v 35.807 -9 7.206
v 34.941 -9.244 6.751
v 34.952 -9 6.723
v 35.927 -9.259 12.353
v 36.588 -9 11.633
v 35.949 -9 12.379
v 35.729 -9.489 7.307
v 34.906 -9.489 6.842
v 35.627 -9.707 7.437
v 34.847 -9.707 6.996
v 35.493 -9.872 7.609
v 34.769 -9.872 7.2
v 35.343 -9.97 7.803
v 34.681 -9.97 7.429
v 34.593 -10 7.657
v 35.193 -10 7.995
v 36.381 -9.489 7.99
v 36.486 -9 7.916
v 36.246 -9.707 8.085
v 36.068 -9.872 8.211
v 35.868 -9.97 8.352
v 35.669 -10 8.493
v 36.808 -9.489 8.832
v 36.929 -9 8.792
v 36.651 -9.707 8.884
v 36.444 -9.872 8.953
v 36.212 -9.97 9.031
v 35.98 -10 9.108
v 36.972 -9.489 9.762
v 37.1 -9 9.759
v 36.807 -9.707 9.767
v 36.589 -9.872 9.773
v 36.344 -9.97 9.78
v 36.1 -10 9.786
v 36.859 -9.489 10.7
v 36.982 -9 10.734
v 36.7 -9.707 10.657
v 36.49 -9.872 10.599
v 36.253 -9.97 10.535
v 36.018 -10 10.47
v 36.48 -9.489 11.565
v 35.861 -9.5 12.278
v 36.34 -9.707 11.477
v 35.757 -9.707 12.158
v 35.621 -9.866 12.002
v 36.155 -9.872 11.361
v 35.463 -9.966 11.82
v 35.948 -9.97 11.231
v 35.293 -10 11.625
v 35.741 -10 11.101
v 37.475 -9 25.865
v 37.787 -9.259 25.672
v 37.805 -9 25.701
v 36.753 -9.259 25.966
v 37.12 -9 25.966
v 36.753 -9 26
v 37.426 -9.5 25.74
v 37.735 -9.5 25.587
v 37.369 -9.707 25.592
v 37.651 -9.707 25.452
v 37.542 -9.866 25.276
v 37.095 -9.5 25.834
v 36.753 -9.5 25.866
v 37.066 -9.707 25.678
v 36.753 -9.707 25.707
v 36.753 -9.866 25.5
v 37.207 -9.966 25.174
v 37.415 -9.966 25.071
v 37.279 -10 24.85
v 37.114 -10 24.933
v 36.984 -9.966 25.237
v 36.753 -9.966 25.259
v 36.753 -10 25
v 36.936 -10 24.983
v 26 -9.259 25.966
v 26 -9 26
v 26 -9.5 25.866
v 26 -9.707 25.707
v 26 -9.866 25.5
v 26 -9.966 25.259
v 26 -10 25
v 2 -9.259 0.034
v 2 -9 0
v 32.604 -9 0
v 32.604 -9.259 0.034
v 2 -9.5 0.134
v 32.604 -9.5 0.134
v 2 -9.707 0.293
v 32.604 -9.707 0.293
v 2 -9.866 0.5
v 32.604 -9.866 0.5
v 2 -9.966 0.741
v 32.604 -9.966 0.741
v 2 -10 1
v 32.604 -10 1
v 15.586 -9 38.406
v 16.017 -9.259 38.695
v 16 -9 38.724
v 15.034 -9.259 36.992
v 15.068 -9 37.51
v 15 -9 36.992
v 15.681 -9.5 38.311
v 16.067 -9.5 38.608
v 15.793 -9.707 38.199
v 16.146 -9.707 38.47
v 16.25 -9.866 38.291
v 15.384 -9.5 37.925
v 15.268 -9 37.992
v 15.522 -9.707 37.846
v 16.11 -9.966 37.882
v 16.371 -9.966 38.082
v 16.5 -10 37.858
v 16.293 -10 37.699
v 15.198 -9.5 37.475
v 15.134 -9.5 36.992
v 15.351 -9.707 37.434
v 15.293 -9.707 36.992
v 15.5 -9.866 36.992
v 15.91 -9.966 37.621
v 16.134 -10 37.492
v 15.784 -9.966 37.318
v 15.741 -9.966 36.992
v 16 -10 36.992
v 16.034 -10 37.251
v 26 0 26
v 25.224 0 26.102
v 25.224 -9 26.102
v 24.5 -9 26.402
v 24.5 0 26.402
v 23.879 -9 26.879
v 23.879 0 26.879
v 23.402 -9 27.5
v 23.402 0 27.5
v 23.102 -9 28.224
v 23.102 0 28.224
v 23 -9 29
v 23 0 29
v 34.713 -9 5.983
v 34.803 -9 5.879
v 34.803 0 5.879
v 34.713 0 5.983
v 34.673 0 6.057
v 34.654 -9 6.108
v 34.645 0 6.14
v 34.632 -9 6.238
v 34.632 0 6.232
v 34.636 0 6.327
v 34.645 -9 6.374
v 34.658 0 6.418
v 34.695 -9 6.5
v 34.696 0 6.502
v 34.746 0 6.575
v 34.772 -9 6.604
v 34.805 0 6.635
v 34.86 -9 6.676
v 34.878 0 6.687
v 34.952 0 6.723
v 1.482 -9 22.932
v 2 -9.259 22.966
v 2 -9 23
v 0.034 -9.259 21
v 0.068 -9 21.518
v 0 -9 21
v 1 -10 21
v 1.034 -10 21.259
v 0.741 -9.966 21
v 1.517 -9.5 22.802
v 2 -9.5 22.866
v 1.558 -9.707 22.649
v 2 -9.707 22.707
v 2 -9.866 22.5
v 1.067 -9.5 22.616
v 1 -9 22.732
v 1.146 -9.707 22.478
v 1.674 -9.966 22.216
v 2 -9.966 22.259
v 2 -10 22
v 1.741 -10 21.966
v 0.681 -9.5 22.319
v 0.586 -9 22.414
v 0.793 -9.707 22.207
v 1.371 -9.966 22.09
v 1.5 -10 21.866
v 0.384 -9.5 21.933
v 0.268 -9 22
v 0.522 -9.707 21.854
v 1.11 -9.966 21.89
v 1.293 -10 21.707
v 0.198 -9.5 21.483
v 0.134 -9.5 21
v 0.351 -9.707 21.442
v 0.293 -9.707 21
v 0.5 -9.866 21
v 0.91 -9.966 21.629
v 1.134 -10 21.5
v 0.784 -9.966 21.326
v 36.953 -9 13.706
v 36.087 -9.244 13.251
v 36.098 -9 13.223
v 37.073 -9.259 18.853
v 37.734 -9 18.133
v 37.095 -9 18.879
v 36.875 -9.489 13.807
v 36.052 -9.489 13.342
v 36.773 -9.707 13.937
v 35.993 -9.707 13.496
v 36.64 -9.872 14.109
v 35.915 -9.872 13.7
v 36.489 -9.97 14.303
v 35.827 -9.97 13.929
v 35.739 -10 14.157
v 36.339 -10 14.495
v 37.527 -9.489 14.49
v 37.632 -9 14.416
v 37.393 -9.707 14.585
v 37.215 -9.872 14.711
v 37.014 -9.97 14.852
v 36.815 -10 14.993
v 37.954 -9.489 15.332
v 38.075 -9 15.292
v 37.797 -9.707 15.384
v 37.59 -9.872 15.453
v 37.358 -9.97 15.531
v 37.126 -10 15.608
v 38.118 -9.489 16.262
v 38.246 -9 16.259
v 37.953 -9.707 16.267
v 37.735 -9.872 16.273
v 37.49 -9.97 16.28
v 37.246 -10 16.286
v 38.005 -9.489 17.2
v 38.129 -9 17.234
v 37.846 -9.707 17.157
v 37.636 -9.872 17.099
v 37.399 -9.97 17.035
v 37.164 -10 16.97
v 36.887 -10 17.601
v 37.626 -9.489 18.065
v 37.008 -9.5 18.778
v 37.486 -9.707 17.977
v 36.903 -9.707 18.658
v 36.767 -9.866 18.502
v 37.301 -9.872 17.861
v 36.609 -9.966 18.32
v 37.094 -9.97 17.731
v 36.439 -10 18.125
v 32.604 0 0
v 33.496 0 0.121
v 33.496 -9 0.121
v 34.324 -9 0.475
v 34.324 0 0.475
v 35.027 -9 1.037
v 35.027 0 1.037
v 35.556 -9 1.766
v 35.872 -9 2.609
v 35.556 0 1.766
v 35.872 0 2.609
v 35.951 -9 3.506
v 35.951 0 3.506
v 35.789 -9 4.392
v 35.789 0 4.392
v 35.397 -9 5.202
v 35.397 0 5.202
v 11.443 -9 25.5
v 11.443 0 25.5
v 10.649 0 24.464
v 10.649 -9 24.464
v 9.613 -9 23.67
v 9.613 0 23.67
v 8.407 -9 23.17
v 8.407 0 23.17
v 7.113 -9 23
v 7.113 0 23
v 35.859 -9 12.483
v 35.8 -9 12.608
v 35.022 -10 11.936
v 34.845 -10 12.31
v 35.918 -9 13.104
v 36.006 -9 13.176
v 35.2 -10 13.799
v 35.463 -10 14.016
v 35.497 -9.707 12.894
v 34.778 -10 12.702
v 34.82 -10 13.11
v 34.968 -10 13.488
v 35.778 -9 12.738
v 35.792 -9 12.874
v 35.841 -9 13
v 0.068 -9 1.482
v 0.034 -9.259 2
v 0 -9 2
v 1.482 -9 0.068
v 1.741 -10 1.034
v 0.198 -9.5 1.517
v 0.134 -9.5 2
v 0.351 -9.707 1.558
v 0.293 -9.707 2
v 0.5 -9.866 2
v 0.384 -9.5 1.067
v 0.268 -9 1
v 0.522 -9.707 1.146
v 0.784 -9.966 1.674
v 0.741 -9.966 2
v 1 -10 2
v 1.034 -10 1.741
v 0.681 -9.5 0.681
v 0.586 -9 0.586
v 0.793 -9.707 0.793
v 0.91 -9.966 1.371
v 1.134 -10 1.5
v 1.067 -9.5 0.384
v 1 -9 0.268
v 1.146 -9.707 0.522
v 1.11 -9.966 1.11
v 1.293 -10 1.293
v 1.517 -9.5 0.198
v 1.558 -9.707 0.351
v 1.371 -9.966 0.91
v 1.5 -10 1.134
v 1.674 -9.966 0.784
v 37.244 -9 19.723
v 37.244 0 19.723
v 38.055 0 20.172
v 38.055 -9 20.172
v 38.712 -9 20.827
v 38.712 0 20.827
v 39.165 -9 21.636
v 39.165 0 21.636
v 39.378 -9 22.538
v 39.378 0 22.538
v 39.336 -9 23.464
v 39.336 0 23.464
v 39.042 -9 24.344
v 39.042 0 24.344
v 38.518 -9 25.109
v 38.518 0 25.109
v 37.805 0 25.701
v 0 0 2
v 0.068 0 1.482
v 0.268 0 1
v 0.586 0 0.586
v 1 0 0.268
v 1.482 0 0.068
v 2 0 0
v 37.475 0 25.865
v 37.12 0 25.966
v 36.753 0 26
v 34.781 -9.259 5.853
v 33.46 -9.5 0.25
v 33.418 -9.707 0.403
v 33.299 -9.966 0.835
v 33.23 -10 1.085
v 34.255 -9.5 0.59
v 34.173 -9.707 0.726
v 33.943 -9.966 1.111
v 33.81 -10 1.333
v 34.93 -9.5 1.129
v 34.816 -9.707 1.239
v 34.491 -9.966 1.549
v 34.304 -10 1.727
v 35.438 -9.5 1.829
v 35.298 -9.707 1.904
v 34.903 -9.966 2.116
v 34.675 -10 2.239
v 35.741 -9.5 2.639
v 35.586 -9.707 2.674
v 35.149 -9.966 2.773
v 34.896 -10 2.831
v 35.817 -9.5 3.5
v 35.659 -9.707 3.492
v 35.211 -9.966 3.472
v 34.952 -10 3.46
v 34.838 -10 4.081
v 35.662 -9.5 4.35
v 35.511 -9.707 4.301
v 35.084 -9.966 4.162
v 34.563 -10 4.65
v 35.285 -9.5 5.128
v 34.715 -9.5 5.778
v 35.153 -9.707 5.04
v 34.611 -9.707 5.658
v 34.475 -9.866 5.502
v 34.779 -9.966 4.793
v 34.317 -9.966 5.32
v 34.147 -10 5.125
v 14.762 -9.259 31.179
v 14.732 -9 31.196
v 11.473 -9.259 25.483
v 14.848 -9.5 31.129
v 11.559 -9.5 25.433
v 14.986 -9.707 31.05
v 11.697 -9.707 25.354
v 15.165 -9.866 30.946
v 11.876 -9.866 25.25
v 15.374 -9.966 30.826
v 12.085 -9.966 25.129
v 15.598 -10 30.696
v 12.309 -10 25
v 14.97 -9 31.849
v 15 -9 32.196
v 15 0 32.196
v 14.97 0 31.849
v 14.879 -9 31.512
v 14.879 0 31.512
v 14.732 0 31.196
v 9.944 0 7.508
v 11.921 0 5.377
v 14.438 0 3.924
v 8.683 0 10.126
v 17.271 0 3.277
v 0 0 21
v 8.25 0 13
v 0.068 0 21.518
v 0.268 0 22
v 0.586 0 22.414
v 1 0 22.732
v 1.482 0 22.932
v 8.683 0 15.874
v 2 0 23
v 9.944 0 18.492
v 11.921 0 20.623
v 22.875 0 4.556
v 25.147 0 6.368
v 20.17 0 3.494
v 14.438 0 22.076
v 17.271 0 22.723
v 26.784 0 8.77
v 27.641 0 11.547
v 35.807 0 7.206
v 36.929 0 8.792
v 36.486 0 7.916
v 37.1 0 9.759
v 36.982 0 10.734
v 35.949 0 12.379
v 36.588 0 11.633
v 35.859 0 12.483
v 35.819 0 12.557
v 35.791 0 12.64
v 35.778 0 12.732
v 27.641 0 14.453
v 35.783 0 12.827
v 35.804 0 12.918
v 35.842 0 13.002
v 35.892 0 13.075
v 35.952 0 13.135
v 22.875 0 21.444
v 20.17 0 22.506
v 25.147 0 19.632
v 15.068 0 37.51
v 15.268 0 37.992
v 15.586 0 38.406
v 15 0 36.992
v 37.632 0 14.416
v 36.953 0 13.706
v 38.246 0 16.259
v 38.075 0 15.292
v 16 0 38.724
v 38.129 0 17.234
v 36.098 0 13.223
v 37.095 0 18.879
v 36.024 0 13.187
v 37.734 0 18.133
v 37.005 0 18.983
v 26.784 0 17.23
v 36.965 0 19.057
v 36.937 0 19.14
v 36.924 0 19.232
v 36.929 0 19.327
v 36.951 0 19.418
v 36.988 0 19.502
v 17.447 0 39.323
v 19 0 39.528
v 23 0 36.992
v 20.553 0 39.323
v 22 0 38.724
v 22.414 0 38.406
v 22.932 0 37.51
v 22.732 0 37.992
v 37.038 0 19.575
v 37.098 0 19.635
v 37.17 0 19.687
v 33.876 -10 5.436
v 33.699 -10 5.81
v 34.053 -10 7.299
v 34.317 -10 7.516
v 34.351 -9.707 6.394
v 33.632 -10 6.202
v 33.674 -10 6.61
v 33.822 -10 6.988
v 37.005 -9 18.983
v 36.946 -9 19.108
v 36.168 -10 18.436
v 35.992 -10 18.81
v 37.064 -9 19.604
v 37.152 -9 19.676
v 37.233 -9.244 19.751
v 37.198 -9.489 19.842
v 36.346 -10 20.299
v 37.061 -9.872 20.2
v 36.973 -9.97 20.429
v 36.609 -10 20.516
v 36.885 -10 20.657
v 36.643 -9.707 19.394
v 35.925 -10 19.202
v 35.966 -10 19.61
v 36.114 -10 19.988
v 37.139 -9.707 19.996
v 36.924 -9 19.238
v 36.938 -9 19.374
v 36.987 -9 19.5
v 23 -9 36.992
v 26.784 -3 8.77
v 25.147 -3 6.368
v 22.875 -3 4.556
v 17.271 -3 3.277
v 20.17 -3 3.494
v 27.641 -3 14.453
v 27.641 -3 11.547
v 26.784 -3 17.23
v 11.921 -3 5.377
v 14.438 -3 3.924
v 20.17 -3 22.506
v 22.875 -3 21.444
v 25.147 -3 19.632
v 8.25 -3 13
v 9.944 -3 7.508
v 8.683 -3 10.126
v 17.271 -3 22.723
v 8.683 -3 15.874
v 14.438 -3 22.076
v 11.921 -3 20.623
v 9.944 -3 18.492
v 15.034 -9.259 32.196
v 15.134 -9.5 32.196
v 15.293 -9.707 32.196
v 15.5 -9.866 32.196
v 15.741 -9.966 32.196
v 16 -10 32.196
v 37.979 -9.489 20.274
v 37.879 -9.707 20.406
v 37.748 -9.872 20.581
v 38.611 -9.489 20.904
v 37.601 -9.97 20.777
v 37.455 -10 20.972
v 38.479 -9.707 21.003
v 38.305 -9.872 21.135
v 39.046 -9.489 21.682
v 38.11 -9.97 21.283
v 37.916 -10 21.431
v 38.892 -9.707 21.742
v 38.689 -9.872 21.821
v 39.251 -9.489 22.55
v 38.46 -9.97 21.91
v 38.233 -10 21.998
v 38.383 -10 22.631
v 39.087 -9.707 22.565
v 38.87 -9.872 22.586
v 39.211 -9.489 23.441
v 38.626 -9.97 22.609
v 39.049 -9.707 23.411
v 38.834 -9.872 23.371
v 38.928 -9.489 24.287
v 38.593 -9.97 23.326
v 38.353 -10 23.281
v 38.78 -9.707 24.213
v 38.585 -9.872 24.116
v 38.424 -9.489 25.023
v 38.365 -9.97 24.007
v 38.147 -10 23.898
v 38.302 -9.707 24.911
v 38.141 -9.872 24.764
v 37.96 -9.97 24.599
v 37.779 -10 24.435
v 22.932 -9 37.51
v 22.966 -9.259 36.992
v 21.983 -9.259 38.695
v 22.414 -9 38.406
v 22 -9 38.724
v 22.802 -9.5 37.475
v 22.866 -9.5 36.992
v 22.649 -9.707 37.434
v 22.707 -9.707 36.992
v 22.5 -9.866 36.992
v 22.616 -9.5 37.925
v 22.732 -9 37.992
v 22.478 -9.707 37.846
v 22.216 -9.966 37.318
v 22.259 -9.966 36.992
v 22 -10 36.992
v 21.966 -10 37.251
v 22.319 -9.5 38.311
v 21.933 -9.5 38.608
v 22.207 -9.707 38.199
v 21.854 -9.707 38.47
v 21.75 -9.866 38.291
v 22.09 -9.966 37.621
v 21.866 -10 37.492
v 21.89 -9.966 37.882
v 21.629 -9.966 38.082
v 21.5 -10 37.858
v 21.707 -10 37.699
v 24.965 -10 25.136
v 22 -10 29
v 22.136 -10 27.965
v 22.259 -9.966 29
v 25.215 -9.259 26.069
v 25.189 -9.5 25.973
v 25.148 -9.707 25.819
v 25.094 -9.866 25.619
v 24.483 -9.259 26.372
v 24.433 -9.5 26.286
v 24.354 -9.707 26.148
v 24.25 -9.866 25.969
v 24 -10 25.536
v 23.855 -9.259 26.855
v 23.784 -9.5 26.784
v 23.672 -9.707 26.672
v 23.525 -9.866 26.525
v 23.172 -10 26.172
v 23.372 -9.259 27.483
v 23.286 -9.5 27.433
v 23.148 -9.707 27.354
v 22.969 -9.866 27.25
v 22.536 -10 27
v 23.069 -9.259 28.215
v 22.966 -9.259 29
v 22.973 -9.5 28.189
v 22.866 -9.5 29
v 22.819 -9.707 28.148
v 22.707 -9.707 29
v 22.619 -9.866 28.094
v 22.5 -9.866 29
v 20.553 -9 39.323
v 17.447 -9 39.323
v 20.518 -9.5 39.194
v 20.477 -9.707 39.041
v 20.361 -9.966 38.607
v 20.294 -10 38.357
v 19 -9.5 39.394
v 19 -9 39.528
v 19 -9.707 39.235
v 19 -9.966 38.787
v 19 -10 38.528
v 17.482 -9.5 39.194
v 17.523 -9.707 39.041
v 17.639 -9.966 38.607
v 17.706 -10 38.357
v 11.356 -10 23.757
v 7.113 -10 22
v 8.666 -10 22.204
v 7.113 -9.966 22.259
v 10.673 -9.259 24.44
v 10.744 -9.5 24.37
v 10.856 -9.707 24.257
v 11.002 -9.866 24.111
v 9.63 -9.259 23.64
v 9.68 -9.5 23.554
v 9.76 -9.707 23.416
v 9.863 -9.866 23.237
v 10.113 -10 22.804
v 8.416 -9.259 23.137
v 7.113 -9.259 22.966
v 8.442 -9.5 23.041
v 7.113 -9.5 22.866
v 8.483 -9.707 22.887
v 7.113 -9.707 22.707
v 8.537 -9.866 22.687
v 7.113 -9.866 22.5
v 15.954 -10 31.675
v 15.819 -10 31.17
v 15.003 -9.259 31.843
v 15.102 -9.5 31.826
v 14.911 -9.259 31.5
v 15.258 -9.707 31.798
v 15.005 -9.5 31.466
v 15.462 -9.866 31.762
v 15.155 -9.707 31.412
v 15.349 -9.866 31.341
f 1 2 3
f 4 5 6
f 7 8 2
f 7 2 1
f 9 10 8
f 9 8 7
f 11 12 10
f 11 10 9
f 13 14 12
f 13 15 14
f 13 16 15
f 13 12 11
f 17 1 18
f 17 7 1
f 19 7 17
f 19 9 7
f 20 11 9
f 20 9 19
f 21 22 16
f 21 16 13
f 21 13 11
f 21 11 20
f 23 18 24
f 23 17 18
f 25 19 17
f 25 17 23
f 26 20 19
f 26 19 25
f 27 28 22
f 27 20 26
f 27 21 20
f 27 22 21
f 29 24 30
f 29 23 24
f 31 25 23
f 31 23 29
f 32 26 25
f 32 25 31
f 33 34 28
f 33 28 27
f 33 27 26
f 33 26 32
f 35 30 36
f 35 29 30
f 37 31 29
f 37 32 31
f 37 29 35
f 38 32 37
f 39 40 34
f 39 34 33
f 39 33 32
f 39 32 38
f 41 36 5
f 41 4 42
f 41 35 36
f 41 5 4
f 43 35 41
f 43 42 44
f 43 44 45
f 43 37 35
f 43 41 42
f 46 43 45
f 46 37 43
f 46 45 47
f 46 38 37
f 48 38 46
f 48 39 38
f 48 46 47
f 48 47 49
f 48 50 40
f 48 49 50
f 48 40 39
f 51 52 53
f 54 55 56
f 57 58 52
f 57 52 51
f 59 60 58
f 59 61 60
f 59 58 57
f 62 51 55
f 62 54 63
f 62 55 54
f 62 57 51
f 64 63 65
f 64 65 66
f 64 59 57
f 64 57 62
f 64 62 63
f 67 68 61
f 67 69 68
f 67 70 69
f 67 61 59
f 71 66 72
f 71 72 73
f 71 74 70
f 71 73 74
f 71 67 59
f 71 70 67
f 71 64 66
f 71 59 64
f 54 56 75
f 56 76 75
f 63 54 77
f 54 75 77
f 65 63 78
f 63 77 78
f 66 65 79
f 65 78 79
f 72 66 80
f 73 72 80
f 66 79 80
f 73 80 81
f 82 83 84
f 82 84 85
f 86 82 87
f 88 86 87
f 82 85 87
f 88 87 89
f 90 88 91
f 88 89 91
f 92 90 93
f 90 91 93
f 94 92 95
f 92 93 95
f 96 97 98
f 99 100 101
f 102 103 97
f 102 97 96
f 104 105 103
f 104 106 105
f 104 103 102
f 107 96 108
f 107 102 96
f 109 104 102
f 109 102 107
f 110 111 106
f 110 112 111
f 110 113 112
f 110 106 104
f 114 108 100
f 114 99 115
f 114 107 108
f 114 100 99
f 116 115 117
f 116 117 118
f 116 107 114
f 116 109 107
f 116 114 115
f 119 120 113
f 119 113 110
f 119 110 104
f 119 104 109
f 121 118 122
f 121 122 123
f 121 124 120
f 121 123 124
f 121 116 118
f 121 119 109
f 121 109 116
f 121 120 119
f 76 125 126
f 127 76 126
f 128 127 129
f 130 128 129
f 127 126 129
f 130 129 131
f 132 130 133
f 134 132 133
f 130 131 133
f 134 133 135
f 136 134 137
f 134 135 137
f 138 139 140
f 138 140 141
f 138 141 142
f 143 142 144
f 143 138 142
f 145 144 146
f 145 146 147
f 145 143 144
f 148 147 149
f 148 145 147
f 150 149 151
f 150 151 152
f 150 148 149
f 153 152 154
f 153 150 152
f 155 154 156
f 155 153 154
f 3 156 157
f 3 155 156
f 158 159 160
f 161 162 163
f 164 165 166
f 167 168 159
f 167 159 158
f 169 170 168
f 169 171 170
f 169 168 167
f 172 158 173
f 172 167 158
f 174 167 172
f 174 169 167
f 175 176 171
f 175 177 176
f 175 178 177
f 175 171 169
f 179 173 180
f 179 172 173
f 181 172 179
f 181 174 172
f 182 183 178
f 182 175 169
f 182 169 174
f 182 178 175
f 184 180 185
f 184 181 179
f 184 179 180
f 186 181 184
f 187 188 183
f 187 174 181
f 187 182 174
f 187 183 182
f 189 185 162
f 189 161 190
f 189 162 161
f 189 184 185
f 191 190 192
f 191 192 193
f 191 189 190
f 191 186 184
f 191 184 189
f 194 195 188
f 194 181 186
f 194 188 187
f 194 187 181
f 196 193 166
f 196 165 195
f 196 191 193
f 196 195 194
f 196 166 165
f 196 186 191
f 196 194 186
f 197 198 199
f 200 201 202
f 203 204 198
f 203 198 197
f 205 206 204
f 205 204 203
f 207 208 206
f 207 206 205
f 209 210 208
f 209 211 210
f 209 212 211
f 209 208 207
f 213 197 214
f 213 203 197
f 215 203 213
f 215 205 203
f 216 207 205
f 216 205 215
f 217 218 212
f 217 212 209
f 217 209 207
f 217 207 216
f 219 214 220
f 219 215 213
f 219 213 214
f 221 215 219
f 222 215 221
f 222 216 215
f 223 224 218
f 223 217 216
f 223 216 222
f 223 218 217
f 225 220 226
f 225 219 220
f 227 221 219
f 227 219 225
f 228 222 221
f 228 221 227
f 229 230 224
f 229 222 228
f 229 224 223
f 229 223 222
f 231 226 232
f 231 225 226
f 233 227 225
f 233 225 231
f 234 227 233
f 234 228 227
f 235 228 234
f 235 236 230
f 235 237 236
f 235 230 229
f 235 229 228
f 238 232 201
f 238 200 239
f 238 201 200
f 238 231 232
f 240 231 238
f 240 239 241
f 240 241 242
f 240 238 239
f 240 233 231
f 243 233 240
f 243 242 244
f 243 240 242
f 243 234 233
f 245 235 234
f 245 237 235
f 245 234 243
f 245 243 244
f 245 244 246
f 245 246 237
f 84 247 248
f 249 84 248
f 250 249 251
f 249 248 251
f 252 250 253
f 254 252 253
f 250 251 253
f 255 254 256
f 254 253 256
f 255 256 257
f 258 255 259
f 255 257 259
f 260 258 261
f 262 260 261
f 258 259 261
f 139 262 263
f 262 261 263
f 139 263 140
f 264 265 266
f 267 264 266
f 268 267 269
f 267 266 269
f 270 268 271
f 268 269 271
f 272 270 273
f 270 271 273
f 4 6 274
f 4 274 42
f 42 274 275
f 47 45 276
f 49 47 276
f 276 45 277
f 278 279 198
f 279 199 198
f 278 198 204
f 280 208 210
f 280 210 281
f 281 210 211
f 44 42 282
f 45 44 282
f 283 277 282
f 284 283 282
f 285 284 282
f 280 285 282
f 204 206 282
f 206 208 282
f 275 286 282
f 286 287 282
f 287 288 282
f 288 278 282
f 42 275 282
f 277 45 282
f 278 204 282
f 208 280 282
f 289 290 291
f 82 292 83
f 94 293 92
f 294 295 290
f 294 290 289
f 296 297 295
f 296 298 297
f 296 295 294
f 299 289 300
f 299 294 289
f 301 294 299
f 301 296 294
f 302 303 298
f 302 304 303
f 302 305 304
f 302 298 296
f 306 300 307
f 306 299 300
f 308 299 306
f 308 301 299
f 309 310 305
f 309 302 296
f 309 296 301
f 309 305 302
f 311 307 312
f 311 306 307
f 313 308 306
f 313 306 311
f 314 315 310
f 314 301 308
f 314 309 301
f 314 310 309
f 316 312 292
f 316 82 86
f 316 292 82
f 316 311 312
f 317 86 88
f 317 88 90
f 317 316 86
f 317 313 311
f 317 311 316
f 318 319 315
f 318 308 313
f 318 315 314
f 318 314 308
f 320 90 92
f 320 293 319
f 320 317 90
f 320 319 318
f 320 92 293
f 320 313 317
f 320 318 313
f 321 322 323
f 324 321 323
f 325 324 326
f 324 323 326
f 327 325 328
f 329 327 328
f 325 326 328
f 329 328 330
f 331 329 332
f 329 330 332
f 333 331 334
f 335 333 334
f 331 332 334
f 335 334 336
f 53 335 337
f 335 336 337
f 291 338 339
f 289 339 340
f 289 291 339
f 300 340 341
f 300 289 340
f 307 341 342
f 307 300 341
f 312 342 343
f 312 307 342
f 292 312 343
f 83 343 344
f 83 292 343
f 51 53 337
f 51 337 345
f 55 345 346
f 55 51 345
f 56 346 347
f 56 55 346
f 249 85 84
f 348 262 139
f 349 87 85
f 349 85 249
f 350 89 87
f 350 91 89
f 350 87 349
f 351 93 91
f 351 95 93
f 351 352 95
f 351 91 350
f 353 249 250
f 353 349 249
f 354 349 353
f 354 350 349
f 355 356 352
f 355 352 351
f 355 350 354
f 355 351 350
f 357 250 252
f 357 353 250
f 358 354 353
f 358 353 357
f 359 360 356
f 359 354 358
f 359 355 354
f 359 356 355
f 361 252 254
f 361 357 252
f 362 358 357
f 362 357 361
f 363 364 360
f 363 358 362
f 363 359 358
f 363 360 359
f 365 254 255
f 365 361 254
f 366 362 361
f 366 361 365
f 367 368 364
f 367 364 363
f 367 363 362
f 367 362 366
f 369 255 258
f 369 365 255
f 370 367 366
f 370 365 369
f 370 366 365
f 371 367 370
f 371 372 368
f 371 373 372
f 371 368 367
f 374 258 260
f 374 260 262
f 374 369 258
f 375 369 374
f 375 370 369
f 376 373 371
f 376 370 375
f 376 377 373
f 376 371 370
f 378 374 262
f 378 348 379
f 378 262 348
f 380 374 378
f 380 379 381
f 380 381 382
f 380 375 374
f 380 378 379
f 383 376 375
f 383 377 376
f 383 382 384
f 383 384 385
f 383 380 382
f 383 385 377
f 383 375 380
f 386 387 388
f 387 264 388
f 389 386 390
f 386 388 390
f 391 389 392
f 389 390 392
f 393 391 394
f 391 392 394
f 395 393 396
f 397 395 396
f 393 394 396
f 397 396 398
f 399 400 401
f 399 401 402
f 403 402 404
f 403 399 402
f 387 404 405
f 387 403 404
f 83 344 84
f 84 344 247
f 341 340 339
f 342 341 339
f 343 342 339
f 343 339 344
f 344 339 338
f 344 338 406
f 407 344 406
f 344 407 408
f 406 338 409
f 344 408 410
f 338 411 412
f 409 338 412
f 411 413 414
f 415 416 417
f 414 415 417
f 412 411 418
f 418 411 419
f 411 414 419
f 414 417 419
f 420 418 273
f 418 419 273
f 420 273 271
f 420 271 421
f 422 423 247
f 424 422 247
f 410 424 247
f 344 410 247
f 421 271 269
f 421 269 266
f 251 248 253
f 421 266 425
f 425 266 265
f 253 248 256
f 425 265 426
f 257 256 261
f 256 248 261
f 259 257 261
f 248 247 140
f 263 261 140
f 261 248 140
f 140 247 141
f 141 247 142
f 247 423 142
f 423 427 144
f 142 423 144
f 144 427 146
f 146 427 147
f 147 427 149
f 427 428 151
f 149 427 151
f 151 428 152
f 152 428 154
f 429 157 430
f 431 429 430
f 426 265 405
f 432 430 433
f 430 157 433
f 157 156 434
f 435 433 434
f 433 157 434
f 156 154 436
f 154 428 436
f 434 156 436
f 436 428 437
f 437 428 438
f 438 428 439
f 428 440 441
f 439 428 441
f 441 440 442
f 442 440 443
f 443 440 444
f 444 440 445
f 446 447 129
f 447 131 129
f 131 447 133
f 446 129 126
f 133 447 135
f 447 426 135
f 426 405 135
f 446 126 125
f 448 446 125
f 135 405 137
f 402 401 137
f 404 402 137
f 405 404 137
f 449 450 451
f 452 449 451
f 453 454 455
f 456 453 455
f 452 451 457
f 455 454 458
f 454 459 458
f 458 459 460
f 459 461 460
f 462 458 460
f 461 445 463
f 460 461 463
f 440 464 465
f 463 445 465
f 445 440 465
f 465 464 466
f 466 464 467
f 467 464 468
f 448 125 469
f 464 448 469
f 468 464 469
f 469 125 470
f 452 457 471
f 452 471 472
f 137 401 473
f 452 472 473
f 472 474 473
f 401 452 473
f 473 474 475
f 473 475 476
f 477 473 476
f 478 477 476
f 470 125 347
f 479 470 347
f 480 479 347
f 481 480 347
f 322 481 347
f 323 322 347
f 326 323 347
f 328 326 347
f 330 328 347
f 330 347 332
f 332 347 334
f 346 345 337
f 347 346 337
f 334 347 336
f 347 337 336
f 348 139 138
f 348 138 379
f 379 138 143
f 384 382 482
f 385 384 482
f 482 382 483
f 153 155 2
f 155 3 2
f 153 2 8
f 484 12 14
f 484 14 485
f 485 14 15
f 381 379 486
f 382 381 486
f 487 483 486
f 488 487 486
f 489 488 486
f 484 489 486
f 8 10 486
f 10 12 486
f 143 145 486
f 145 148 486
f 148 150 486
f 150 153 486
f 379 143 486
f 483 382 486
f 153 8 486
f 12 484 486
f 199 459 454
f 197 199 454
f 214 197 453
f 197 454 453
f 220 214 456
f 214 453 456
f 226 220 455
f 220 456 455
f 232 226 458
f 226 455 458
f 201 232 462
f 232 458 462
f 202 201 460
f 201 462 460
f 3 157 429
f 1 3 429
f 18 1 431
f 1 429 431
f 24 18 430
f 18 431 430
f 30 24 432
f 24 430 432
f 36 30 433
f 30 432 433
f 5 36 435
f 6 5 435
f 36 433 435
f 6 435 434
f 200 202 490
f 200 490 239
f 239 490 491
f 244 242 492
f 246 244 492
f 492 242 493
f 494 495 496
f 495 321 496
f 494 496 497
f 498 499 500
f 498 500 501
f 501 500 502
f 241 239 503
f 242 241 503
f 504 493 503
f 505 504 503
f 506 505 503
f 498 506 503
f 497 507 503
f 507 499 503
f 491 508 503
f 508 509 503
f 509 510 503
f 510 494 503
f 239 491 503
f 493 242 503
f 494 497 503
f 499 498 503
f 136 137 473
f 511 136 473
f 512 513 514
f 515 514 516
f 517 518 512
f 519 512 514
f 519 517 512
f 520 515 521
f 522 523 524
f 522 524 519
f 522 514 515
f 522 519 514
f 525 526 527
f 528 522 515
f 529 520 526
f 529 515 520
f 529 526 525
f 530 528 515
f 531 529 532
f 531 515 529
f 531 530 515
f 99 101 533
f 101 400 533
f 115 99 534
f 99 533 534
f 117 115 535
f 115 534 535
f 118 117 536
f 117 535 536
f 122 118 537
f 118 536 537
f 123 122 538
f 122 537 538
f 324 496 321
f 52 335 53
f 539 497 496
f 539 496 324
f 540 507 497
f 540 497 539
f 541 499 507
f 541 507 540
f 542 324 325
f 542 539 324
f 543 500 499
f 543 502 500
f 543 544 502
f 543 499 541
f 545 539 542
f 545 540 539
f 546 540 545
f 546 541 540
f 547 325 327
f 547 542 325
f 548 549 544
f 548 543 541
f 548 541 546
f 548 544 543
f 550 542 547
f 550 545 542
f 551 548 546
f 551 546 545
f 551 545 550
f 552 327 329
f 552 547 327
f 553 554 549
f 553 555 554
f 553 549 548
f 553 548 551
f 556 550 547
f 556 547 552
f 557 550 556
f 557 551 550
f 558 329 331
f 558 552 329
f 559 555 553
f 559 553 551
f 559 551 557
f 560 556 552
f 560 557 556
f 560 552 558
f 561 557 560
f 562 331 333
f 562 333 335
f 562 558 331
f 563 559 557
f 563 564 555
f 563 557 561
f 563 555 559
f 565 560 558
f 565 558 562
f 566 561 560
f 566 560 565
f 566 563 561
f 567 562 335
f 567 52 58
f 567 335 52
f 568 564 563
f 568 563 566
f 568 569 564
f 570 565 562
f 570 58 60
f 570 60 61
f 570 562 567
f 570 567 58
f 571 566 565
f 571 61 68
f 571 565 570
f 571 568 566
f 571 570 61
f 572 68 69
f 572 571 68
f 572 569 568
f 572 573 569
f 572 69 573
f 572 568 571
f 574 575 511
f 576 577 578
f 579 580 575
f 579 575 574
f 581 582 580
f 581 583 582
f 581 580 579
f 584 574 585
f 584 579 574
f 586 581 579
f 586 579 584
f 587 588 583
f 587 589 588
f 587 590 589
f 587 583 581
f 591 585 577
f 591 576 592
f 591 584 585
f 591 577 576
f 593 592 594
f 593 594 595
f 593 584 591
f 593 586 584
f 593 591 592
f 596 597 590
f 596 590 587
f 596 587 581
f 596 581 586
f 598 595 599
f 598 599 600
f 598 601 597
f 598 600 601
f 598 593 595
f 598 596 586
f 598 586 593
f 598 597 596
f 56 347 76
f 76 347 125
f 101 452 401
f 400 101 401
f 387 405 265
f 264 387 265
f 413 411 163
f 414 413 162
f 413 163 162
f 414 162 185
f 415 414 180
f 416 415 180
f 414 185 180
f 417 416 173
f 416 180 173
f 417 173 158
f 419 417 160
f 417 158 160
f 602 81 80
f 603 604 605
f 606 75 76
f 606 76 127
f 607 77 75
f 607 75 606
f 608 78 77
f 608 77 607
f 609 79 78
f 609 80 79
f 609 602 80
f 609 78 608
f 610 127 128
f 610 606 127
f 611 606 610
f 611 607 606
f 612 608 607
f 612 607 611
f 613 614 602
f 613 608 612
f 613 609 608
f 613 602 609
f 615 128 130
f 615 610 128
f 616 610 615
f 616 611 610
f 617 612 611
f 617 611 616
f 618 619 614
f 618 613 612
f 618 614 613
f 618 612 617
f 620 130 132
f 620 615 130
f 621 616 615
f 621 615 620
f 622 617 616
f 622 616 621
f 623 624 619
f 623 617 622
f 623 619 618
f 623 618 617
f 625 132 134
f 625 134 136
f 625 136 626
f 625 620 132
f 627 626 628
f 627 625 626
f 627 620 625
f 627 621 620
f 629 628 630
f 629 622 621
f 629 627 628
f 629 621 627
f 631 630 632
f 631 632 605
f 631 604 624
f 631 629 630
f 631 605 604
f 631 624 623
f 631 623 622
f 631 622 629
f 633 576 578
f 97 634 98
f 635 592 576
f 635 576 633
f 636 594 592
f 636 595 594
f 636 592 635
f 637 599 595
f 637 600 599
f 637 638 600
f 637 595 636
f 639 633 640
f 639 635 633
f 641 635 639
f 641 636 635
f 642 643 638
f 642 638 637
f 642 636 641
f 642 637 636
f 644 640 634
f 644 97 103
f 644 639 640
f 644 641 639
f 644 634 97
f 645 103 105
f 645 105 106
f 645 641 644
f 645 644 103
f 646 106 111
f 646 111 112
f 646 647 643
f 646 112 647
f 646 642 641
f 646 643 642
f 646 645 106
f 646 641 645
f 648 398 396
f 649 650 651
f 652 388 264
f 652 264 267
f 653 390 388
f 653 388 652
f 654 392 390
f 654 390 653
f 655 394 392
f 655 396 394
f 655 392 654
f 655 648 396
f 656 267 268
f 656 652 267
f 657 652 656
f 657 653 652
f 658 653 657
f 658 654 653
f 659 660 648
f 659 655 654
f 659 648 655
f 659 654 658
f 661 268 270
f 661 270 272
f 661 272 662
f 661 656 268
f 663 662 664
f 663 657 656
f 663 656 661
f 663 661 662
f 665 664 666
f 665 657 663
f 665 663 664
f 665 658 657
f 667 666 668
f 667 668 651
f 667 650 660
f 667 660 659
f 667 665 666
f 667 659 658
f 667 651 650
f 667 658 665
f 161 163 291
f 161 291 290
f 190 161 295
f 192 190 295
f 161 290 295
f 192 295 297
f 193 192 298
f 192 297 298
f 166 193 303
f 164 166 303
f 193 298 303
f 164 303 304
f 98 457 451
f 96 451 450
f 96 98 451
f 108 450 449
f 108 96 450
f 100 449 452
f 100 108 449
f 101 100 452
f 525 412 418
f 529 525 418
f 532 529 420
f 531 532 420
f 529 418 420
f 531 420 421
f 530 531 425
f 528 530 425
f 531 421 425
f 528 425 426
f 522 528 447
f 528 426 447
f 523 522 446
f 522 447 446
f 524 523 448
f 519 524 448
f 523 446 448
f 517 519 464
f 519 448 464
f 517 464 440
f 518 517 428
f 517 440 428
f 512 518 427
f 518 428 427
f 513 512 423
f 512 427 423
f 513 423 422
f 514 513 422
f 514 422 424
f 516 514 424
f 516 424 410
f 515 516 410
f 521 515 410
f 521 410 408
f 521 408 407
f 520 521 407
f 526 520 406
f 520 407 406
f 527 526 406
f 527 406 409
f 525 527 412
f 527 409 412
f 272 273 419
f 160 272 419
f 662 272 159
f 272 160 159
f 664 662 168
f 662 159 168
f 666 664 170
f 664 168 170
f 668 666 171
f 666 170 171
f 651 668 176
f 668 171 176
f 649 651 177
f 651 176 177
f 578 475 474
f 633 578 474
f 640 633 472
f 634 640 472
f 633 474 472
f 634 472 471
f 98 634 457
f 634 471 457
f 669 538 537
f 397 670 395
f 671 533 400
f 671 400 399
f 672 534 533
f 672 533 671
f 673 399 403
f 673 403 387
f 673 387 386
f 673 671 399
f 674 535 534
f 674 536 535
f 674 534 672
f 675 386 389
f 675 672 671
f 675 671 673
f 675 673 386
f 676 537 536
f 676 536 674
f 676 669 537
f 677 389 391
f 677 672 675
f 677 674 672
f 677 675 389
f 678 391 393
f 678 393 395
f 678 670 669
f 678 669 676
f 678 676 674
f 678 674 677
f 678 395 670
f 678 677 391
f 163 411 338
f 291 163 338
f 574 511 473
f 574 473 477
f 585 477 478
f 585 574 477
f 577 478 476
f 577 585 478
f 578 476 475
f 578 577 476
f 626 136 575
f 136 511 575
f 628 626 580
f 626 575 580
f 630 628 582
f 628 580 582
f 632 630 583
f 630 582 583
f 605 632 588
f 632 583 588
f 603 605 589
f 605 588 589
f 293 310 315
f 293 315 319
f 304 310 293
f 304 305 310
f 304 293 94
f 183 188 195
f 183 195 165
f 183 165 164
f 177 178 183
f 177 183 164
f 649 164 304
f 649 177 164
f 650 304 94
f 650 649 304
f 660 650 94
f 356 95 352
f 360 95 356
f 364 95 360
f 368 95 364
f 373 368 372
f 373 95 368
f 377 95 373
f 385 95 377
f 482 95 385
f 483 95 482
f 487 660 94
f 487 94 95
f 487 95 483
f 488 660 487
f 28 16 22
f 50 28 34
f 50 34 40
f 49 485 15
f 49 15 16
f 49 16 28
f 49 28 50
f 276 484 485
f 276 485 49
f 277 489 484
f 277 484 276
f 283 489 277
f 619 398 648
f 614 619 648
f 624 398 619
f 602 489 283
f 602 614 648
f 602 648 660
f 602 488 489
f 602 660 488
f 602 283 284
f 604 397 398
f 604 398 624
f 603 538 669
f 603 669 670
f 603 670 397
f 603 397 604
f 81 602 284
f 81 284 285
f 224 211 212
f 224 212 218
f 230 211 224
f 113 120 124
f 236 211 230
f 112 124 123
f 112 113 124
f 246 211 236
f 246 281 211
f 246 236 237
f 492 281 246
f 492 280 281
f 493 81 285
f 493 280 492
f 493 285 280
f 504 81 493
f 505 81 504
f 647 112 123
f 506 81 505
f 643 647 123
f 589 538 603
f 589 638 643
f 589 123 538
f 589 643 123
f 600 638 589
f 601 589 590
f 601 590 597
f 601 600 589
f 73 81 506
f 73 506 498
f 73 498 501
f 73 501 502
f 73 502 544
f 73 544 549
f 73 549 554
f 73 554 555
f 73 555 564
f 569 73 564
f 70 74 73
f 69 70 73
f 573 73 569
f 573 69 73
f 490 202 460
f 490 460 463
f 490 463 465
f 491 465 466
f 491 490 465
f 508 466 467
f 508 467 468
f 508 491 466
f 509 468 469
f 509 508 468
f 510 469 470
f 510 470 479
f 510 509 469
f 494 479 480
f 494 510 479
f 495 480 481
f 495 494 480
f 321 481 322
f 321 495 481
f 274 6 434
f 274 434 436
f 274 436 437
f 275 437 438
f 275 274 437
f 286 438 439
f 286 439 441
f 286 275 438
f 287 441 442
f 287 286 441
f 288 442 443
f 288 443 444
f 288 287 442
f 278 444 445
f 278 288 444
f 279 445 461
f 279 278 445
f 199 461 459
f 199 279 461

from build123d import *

# Parameters (mm, degrees)
F1_DEPTH = 10
F2_R     = 2
F3_R     = 9.75
F4_DEPTH = 3
F5_R     = 0.5
F6_R     = 1


with BuildPart() as f1:
    # F0 (on Front) → F1 (new body)
    with BuildSketch(Plane.XZ):
        with BuildLine():
            Line((0, 23), (0, 0))
            Line((0, 0), (32.603637, 0))
            ThreePointArc((32.603637, 0), (35.903773, 2.769143), (33.749762, 6.5))
            ThreePointArc((33.749762, 6.5), (37.049899, 9.269143), (34.895887, 13))
            ThreePointArc((34.895887, 13), (38.196024, 15.769143), (36.042013, 19.5))
            ThreePointArc((36.042013, 19.5), (39.342149, 22.269143), (37.188138, 26))
            Line((37.188138, 26), (26, 26))
            ThreePointArc((26, 26), (23.87868, 26.87868), (23, 29))
            Line((23, 29), (23, 38))
            ThreePointArc((23, 38), (19, 39.527864), (15, 38))
            Line((15, 38), (15, 31.660254))
            Line((15, 31.660254), (11.443376, 25.5))
            ThreePointArc((11.443376, 25.5), (9.613249, 23.669873), (7.113249, 23))
            Line((7.113249, 23), (0, 23))
        make_face()
    extrude(amount=F1_DEPTH)

    # F2
    f2_edges = [f1.edges().sort_by_distance(p)[0] for p in [
        (37.188138, -5, 26),
        (23, -5, 38),
        (15, -5, 38),
        (15, -5, 31.660254),
        (0, -5, 23),
        (0, -5, 0),
    ]]
    fillet(f2_edges, radius=F2_R)

    # F3 (on face) → F4 (cut)
    with BuildSketch(Plane(origin=(0, 0, 0), x_dir=(-1, 0, 0), z_dir=(0, 1, 0))):
        with Locations((-18, 13)):
            Circle(F3_R)
    extrude(amount=-F4_DEPTH, mode=Mode.SUBTRACT)

    # F5
    f5_edges = [f1.edges().sort_by_distance(p)[0] for p in [
        (33.749762, -5, 6.5),
        (34.895887, -5, 13),
        (36.042013, -5, 19.5),
    ]]
    fillet(f5_edges, radius=F5_R)

    # F6
    f6_edges = [f1.edges().sort_by_distance(p)[0] for p in [
        (35.742216, -10, 2.176809),
        (34.638998, -10, 6.343204),
        (17.301818, -10, 0),
        (37.049899, -10, 9.269143),
        (0.585786, -10, 0.585786),
        (35.785124, -10, 12.843204),
        (0, -10, 11.5),
        (38.196024, -10, 15.769143),
        (0.585786, -10, 22.414214),
        (36.931249, -10, 19.343204),
        (4.556624, -10, 23),
        (39.378411, -10, 22.538066),
        (9.613249, -10, 23.669873),
        (37.299769, -10, 25.923755),
        (13.087713, -10, 28.348076),
        (31.376405, -10, 26),
        (14.931852, -10, 31.678514),
        (23.87868, -10, 26.87868),
        (15, -10, 34.594059),
        (23, -10, 32.995983),
        (15.267949, -10, 37.991966),
        (22.732051, -10, 37.991966),
        (19, -10, 39.527864),
    ]]
    fillet(f6_edges, radius=F6_R)


solid = f1.part
